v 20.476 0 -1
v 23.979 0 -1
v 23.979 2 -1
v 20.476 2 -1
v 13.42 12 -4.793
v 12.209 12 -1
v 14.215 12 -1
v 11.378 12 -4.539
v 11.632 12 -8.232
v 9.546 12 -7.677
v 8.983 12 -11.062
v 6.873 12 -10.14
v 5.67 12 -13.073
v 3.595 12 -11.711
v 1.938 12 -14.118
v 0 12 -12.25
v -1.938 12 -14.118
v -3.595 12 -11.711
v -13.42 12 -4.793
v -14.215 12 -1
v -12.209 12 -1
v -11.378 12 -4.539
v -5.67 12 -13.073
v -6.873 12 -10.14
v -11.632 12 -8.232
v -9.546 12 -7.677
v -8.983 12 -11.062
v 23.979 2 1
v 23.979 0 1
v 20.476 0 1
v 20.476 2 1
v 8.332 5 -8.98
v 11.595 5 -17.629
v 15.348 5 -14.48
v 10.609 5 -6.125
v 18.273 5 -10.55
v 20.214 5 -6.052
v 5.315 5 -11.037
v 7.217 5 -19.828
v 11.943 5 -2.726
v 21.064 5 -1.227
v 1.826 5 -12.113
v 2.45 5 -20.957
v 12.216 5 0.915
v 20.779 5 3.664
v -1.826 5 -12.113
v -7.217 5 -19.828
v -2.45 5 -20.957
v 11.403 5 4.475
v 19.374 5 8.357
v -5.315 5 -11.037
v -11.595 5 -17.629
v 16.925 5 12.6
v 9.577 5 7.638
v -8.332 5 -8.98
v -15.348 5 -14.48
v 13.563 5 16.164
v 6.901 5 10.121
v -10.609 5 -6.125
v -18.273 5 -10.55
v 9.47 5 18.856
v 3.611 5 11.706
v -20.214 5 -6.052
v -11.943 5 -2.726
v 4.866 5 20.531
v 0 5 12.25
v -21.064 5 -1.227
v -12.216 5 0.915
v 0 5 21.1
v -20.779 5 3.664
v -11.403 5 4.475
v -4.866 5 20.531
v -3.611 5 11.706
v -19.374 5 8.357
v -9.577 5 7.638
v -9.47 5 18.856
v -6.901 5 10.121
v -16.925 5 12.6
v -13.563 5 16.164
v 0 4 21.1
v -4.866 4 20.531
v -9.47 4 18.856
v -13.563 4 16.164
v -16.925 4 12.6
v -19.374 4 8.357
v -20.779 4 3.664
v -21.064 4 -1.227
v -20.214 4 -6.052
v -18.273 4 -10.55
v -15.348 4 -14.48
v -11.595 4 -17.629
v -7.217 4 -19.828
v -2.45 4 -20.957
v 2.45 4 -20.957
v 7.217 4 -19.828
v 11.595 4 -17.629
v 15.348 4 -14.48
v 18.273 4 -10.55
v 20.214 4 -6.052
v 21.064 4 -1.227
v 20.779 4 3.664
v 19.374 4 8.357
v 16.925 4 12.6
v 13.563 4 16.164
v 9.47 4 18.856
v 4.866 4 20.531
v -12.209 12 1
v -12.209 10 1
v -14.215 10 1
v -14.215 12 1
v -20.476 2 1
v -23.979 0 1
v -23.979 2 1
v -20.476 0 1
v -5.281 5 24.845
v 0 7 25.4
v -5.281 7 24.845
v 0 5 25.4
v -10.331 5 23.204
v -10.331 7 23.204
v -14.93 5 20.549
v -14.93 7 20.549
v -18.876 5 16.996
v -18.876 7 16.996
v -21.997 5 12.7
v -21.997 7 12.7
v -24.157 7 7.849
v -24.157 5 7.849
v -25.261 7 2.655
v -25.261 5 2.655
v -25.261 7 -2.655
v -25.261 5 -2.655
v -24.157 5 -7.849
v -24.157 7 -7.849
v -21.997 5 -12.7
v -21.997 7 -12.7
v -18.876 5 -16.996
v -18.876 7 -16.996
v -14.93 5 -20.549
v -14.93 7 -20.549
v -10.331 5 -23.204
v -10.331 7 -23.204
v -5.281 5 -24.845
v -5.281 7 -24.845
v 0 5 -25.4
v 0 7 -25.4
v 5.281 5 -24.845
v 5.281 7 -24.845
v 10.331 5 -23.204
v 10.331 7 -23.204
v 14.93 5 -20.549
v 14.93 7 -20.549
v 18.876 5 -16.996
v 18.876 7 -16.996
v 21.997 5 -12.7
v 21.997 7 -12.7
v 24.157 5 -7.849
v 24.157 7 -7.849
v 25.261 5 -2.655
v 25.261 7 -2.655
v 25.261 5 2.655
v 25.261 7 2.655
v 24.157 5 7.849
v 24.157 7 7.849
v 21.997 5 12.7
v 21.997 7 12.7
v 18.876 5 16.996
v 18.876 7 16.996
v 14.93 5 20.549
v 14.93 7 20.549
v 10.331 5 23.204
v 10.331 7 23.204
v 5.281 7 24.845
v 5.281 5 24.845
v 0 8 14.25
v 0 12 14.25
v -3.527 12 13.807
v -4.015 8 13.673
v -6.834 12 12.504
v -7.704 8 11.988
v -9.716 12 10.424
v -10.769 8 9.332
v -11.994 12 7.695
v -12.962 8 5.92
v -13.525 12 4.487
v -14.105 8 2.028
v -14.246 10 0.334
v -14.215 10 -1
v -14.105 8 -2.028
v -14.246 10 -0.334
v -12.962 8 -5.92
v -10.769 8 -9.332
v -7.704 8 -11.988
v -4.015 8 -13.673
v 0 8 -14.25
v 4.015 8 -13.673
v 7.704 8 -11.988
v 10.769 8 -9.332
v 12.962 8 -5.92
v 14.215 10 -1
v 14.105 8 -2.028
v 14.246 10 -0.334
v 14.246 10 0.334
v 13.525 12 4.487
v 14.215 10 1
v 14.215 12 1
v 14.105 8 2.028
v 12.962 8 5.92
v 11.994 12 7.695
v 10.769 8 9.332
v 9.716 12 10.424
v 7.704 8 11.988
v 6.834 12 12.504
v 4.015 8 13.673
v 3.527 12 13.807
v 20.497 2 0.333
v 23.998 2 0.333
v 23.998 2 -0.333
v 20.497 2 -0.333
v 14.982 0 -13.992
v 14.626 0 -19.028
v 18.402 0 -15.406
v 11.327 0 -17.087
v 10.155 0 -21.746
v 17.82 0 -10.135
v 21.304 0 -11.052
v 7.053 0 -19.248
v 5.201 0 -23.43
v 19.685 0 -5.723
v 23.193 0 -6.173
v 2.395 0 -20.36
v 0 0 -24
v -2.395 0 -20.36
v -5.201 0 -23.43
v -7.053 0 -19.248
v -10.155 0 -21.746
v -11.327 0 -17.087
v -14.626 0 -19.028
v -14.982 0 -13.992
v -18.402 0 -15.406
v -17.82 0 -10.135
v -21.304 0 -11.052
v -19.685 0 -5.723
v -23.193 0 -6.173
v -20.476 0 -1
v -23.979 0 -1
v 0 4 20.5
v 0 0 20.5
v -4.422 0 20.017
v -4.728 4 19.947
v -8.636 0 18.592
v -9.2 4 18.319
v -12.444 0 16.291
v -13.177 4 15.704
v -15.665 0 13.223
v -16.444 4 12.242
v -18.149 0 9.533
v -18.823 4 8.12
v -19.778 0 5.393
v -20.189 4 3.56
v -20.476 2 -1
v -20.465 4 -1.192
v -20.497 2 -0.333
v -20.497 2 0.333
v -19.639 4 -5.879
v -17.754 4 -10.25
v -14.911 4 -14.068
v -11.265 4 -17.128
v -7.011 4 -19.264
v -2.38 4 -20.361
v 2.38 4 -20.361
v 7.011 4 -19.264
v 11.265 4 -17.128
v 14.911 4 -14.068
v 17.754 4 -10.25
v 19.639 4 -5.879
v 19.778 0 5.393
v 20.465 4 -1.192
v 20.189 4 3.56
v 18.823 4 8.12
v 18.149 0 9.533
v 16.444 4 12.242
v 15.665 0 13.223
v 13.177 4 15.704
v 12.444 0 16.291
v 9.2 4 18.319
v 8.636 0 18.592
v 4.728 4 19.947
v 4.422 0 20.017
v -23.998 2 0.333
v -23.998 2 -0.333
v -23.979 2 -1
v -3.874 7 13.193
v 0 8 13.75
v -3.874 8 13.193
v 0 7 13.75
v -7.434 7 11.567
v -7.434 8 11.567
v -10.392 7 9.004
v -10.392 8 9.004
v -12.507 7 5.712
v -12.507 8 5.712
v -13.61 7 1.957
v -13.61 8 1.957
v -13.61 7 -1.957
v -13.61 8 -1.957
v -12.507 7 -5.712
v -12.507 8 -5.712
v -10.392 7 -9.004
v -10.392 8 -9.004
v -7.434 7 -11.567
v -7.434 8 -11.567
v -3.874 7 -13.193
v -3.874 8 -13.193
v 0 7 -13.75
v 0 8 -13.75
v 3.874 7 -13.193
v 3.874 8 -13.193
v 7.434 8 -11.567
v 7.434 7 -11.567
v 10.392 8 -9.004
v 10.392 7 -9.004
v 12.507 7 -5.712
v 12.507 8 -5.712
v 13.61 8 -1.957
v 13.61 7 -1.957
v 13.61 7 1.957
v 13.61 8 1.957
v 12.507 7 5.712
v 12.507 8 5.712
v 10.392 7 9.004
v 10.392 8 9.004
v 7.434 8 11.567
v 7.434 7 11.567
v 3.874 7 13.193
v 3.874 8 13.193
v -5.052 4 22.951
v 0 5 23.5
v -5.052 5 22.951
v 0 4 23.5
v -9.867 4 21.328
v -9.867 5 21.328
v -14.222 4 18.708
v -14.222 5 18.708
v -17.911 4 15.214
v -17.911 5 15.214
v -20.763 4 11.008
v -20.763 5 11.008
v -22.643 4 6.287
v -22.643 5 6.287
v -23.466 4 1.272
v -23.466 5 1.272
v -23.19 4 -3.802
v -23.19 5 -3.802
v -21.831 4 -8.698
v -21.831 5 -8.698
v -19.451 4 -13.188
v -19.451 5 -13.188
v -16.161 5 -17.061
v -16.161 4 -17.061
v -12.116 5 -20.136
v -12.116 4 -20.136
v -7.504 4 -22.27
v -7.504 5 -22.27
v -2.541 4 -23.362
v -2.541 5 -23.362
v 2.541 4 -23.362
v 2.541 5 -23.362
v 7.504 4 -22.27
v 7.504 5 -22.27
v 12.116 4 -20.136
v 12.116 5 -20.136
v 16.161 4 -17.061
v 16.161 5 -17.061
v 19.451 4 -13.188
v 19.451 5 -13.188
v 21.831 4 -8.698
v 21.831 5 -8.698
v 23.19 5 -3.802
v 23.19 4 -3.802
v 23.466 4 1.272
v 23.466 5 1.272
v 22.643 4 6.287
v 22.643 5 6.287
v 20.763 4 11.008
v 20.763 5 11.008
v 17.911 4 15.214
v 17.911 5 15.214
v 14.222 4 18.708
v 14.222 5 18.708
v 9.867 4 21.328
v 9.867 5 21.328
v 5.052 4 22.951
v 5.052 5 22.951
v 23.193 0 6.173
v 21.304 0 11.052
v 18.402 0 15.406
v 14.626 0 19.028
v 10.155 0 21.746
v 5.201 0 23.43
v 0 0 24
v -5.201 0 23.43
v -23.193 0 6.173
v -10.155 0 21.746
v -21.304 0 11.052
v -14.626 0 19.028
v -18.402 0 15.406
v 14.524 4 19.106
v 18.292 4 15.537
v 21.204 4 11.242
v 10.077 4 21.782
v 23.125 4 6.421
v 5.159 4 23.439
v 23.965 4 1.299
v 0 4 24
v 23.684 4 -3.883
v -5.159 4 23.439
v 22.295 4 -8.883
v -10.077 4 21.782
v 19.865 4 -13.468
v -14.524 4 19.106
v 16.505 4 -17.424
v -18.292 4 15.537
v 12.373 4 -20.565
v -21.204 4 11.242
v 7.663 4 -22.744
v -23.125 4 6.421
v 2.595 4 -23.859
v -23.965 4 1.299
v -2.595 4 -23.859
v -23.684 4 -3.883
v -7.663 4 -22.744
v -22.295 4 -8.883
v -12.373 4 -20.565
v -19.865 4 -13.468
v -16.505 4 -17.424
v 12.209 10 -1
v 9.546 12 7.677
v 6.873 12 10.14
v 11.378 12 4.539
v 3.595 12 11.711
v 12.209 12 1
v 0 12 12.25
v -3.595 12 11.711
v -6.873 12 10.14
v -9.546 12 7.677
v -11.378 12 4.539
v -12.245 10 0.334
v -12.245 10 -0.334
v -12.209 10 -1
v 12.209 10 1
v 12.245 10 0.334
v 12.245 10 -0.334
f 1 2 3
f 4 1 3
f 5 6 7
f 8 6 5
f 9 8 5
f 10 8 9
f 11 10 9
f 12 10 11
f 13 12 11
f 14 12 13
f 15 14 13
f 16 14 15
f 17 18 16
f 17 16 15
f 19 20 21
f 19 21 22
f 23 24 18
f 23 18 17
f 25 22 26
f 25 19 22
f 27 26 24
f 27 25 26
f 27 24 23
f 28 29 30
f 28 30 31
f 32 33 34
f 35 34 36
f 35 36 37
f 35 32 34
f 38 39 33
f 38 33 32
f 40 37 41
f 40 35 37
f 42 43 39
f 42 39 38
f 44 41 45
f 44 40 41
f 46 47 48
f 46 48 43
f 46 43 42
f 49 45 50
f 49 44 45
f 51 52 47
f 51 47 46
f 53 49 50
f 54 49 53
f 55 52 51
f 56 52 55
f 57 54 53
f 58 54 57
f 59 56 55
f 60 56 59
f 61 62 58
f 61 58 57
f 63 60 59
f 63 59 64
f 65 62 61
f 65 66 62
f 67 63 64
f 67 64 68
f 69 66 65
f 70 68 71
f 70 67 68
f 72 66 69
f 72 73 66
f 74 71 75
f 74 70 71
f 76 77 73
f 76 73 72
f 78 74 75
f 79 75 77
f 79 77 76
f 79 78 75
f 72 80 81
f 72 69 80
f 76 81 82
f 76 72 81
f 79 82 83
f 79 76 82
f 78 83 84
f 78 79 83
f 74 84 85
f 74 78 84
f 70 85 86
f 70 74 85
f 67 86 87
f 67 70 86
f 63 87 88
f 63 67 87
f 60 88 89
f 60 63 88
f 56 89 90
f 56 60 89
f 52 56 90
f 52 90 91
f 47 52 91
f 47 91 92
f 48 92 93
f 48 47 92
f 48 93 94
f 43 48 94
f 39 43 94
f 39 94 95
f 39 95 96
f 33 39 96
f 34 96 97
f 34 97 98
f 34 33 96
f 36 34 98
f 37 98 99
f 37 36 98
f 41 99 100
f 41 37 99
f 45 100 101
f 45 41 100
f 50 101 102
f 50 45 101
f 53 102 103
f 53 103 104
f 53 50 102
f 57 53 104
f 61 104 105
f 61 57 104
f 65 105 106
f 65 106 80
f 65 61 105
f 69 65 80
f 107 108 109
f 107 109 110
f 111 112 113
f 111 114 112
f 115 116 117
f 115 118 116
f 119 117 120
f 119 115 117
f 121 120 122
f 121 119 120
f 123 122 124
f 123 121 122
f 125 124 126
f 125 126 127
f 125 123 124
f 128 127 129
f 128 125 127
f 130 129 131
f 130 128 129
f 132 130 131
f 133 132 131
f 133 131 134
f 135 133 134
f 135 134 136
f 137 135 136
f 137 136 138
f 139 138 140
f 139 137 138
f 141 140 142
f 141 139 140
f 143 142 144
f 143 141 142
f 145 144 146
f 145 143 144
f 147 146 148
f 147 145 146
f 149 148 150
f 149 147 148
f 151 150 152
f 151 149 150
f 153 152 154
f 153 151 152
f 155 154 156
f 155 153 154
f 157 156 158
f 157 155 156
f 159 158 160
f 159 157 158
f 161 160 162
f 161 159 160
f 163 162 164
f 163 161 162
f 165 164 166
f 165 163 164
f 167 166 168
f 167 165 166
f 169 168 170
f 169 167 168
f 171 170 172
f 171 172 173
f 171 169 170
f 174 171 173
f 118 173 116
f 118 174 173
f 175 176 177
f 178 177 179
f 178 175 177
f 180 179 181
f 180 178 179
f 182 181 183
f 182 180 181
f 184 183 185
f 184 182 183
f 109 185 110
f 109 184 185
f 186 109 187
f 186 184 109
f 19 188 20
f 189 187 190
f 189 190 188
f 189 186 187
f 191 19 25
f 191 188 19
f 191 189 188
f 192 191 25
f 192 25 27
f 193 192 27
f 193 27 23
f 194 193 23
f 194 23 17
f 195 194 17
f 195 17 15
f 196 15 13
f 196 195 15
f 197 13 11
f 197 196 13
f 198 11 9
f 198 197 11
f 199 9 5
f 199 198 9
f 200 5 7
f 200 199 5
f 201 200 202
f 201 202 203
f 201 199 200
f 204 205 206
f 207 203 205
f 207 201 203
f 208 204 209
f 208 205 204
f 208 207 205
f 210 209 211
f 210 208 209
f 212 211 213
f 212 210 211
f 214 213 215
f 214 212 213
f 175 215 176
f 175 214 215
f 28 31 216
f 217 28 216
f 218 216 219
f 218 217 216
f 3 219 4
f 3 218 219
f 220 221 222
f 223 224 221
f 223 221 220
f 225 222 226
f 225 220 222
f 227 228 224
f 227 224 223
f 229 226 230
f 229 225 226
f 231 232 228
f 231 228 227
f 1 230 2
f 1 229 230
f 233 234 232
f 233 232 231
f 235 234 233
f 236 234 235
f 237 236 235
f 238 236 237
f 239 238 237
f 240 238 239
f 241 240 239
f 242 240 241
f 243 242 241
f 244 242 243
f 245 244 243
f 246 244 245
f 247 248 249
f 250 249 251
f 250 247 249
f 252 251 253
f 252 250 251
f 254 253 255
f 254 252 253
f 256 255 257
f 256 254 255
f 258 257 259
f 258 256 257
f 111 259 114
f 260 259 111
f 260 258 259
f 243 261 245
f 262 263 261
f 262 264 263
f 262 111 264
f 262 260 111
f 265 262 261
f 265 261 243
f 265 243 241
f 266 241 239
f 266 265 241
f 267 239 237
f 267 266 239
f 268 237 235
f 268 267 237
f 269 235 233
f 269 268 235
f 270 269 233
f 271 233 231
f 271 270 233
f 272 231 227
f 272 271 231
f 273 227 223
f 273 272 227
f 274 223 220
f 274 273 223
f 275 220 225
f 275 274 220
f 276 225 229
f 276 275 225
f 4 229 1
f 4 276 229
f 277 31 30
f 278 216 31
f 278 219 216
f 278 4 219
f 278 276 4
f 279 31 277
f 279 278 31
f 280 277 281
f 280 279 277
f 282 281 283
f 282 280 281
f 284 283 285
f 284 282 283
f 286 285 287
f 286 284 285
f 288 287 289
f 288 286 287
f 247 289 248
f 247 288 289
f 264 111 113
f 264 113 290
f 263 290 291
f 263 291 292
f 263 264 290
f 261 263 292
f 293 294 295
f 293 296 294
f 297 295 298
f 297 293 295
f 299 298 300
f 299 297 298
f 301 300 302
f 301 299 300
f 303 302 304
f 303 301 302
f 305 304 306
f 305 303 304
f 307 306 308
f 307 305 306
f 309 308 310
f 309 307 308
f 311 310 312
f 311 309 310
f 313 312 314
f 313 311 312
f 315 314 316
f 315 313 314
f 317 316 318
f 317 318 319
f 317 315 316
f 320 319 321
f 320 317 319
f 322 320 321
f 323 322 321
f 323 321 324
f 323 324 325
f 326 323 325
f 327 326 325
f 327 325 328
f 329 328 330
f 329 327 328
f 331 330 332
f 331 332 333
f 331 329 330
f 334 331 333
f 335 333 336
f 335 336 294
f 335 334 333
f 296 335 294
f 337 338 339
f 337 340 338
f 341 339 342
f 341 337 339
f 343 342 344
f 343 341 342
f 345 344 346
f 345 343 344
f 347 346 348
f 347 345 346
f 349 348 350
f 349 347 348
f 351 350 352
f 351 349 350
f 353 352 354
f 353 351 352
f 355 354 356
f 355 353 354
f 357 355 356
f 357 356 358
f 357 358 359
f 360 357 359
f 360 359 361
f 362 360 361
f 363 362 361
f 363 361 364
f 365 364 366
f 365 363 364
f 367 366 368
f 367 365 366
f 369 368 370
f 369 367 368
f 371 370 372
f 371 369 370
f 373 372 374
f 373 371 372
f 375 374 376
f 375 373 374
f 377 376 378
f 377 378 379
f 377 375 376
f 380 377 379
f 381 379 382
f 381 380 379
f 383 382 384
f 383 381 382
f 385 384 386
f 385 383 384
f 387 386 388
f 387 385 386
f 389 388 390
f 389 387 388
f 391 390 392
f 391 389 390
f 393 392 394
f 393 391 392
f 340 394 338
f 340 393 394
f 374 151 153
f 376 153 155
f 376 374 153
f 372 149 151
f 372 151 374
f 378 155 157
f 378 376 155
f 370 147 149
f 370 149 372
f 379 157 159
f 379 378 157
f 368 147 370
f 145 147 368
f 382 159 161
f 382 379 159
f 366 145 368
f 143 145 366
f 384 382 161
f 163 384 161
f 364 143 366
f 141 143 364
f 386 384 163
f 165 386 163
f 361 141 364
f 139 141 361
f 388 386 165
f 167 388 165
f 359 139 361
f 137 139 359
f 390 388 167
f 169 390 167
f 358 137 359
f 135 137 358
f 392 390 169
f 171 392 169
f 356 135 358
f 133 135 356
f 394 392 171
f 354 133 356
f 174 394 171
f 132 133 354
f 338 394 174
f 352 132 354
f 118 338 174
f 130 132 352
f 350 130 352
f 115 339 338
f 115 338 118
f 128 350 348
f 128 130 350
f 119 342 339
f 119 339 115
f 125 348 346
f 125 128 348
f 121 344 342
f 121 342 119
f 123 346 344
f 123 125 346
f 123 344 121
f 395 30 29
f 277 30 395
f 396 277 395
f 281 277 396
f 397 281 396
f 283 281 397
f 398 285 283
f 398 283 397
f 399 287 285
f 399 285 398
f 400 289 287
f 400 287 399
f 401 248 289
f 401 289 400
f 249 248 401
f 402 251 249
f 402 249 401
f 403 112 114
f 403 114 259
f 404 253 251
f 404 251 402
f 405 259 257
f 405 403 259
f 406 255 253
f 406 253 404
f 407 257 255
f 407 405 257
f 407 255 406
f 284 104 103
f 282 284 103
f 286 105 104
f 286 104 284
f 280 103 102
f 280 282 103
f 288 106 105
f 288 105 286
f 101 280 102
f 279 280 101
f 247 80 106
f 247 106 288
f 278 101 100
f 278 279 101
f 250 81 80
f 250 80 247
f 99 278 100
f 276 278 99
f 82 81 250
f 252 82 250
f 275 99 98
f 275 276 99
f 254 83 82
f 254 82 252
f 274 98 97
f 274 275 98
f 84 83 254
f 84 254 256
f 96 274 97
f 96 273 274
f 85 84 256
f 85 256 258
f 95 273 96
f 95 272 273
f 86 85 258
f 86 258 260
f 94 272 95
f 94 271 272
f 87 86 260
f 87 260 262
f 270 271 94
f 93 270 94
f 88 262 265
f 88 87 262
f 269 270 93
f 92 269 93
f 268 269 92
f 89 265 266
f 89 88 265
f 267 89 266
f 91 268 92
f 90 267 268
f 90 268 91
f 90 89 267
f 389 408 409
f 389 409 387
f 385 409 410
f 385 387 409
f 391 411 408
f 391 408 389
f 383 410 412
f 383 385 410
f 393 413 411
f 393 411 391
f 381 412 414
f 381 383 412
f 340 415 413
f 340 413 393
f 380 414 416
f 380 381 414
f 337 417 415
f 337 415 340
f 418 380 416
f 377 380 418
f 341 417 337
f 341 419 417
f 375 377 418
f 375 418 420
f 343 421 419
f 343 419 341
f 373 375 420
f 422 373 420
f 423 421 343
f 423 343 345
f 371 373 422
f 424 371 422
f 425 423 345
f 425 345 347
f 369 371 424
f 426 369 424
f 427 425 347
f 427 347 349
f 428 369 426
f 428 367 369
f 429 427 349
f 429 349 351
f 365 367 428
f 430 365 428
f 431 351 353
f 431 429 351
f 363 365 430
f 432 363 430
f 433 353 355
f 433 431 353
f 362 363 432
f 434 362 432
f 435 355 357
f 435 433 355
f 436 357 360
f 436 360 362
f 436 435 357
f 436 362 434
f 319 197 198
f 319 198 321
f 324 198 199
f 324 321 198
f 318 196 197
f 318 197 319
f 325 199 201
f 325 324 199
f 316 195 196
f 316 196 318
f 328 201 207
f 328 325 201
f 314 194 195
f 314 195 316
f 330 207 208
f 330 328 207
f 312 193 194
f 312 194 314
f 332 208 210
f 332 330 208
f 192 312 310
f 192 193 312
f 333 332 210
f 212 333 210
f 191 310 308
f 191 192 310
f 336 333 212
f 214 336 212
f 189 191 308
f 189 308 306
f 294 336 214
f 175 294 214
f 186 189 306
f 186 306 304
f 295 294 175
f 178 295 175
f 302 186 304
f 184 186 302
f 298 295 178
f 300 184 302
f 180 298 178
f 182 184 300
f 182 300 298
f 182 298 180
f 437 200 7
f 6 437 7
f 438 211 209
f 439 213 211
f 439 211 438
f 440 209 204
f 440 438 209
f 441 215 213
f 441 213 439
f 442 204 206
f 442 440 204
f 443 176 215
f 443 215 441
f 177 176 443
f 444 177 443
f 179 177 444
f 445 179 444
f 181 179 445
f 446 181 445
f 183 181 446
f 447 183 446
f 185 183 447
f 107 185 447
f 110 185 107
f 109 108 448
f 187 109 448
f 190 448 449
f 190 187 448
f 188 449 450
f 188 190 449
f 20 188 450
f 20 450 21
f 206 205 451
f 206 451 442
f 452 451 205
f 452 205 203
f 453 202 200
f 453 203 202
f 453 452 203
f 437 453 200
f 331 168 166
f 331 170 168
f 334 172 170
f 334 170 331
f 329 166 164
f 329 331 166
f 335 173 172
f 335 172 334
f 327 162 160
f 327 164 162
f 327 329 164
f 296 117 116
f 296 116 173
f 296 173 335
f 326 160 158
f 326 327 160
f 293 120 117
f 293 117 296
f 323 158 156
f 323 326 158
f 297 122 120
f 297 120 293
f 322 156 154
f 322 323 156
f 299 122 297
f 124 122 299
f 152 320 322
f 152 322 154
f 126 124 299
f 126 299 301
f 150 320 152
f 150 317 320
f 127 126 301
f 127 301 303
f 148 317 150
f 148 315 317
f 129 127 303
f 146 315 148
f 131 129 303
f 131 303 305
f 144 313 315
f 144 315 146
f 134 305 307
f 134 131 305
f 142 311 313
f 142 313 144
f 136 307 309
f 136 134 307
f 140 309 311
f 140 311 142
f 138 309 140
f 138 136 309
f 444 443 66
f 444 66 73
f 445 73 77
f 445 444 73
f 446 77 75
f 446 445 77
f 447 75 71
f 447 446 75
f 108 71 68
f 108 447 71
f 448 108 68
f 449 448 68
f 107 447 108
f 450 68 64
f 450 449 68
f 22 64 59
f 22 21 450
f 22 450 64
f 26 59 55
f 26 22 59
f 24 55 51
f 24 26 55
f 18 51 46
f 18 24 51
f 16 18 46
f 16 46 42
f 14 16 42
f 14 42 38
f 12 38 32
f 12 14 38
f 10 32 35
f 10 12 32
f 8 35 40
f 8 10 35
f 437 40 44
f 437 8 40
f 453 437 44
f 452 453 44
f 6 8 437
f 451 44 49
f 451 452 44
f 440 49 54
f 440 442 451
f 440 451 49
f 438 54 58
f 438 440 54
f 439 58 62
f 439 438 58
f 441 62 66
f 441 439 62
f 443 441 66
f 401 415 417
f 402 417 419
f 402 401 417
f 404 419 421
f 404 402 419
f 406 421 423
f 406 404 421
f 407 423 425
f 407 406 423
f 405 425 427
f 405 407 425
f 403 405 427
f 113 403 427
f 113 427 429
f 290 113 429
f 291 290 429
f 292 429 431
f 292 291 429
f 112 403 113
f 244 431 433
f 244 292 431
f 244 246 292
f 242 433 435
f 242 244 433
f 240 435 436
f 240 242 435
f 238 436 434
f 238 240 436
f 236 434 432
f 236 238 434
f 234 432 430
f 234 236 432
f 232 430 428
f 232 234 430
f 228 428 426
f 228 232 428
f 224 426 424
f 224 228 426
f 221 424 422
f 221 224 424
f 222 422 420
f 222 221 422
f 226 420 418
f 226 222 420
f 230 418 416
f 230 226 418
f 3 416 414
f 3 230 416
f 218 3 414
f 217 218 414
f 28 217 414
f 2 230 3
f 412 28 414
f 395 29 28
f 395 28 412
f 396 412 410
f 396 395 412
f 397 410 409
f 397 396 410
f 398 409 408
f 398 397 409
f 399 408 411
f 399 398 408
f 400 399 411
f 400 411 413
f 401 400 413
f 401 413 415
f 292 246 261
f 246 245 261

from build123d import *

# Parameters (mm, degrees)
SKETCH_2_W          = 2
SKETCH_2_H          = 3.593987872
SKETCH_2_H_2        = 6.667892238
CUT_EXTRUDE_1_DEPTH = 39.5


with BuildPart() as part:
    # 草图1 → 旋转1 (revolve)
    with BuildSketch(Plane.XY, mode=Mode.PRIVATE) as revolve_1_sk:
        Polygon((-12.25, 12), (-14.25, 12), (-14.25, 8), (-13.75, 8), (-13.75, 7), (-25.4, 7), (-25.4, 5), (-23.5, 5), (-23.5, 4), (-24, 4), (-24, 0), (-20.5, 0), (-20.5, 4), (-21.1, 4), (-21.1, 5), (-12.25, 5), align=None)
    revolve(revolve_1_sk.sketch.rotate(Axis((0, 22.677499451, 0), (0, -1, 0)), 270), axis=Axis((0, 22.677499451, 0), (0, -1, 0)))  # turned: the seam where the file's is

    # 草图2 → 切除-拉伸1 (cut, symmetric)
    with BuildSketch(Plane(origin=(0, 0, 0), x_dir=(0, 0, -1), z_dir=(1, 0, 0))):
        with Locations((0, 11.796993936)):
            Rectangle(SKETCH_2_W, SKETCH_2_H)
        with Locations((0, -1.333946119)):
            Rectangle(SKETCH_2_W, SKETCH_2_H_2)
    extrude(amount=CUT_EXTRUDE_1_DEPTH, both=True, mode=Mode.SUBTRACT)


solid = part.part
